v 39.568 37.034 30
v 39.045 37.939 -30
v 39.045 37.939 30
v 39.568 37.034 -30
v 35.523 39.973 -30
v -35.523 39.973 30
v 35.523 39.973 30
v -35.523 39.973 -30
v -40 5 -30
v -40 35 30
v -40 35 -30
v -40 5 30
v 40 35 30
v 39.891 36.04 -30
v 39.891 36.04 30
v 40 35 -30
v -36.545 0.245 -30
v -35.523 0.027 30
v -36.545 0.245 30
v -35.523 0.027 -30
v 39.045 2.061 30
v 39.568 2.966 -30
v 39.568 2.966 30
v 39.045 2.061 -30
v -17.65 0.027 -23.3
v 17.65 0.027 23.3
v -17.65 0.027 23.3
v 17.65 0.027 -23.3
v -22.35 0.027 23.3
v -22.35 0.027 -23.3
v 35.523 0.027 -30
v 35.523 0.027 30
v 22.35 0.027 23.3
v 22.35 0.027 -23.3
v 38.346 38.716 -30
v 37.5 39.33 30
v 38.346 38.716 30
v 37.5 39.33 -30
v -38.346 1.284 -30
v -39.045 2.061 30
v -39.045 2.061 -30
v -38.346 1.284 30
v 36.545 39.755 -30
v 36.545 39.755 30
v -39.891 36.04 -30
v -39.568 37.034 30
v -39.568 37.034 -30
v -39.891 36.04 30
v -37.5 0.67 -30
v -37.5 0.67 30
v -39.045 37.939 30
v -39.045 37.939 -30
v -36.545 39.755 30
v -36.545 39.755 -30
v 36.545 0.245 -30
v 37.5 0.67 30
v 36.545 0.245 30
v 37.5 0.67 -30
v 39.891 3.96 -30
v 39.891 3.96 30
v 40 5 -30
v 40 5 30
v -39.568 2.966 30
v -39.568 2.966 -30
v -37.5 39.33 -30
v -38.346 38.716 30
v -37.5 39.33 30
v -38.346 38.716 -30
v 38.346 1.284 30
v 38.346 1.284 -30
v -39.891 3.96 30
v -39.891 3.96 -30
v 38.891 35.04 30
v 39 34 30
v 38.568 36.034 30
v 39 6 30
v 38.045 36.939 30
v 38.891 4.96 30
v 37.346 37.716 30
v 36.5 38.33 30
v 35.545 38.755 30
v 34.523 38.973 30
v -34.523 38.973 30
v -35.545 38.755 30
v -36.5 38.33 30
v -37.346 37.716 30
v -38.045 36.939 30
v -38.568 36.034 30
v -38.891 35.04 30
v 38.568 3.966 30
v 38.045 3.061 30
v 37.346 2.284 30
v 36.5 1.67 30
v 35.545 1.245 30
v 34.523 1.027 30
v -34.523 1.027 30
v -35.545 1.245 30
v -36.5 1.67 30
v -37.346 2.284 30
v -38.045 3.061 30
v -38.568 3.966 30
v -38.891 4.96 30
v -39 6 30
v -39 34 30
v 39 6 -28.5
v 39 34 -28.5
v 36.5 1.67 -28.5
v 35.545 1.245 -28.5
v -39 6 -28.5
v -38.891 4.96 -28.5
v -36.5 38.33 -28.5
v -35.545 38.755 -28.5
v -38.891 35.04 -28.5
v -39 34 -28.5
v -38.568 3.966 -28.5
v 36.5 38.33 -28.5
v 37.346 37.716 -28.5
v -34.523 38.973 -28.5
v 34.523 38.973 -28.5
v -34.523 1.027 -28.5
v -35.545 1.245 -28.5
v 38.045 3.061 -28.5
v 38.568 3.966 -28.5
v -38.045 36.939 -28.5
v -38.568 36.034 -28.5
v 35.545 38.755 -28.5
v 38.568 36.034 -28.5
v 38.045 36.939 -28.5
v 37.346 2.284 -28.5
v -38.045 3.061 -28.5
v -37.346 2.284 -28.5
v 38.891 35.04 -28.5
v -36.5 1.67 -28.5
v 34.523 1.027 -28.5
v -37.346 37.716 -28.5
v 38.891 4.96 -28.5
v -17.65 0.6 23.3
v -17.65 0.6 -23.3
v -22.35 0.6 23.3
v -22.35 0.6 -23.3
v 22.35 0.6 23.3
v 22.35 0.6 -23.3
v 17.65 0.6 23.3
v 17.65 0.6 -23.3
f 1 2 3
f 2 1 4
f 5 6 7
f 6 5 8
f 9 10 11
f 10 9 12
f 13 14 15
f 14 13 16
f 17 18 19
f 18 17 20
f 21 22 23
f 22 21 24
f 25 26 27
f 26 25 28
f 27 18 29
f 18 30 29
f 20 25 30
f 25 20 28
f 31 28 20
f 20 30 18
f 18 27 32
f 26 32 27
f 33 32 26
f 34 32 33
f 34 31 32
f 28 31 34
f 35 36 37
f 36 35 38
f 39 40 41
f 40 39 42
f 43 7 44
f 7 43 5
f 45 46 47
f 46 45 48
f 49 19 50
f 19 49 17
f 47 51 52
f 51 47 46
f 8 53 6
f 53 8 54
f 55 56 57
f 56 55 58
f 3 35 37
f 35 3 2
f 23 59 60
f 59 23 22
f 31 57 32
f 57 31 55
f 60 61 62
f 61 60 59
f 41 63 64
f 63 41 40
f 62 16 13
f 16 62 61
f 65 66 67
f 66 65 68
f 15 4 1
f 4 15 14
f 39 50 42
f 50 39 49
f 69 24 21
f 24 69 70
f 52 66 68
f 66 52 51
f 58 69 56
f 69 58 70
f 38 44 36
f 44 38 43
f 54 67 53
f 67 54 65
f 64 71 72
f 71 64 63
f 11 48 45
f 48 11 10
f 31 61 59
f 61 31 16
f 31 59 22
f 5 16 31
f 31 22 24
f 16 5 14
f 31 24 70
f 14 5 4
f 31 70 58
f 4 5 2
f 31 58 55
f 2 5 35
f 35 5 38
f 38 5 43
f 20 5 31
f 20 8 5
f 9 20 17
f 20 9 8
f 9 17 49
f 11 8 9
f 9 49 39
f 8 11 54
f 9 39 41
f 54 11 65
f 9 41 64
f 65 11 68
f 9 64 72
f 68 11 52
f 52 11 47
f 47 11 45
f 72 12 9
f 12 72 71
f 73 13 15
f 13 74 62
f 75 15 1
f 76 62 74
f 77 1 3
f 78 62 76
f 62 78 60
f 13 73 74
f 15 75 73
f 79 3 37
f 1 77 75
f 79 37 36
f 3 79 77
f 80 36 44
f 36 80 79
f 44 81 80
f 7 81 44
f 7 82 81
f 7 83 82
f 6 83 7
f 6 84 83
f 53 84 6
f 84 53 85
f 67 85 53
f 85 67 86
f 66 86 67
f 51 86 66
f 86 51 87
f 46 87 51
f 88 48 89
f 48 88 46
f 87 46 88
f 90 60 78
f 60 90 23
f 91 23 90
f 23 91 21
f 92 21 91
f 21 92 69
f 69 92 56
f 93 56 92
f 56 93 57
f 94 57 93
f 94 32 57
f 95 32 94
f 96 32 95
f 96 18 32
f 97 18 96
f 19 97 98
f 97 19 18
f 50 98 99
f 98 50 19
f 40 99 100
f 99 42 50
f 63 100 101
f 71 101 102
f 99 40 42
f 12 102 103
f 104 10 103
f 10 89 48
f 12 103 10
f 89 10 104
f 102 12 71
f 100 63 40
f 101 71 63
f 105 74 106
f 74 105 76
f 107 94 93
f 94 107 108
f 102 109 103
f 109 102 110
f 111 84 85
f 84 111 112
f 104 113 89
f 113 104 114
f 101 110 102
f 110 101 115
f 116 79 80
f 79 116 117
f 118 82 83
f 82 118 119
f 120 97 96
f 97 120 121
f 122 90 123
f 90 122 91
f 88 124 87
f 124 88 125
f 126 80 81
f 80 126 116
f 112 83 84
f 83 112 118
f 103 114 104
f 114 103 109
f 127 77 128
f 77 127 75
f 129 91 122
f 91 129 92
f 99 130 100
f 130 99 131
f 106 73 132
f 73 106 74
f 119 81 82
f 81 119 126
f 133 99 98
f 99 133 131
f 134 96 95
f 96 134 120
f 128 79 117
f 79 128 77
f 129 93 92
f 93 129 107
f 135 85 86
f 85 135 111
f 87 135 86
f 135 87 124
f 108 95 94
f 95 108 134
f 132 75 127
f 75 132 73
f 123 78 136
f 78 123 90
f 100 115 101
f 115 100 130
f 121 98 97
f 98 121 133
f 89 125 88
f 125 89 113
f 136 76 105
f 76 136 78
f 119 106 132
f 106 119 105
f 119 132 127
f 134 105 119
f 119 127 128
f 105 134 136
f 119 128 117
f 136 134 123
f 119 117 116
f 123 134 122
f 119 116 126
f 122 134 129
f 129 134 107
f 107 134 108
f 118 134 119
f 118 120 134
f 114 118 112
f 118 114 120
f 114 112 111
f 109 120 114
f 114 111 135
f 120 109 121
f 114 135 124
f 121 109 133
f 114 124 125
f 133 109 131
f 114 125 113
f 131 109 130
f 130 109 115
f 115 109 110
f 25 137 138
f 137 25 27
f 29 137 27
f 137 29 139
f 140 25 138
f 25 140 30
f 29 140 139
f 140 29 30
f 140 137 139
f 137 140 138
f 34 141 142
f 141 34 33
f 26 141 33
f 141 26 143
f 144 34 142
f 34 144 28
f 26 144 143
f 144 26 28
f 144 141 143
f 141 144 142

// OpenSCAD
// file: IKEA Skadis v2 hook cutouts.scad
skadis_hook_width = 4.5;
skadis_hook_height = 46;
skadis_hole_spacing_width = 40; // middle to middle
cutout_tolerance_w = 0.2;
cutout_tolerance_h = 0.6;


module skadis_hook_cutout(center=false, hook_count=2) {
    
    if(center) {
        translate([-(skadis_hole_spacing_width + skadis_hook_width) / 2, 0, - skadis_hook_height / 2])
        object(hook_count);
    } else {
        object();
    }
    

}

module object(hook_count=2) {
    union() {

        // Cutout for the hook 1
        color("red")
        translate([- cutout_tolerance_w / 2, 0, - cutout_tolerance_h / 2])
        cube([skadis_hook_width + cutout_tolerance_w, 2, skadis_hook_height + cutout_tolerance_h]);

        // Cutout for the hook 2
        color("red")
        translate([- cutout_tolerance_w / 2 + skadis_hole_spacing_width, 0, - cutout_tolerance_h / 2])
        cube([skadis_hook_width + cutout_tolerance_w, 2, skadis_hook_height + cutout_tolerance_h]);

    }
}

skadis_hook_cutout(center = false);
// file: ../modules/roundedcube.scad
// More information: https://danielupshaw.com/openscad-rounded-corners/


// Examples
// color("Yellow")
// roundedcube(3, true, 0.7, "xmin");

// translate(v = [1, 0, 2])
// color("Pink")
// roundedcube([4, 2, 2], false, 0.6, "zmax");

// translate(v = [-4, -1, 2])
// color("Lightblue")
// roundedcube(2, false);

// translate(v = [0, 0, 6])
// color("Orange")
// roundedcube([3, 2, 2], true, 0.2);

// translate(v = [2.5, -0.5, 5])
// color("Green")
// roundedcube([3, 2, 2], false, 0.4, "z");

// Set to 0.01 for higher definition curves (renders slower)
$fs = 0.15;

module roundedcube(size = [1, 1, 1], center = false, radius = 0.5, apply_to = "all") {
	// If single value, convert to [x, y, z] vector
	size = (size[0] == undef) ? [size, size, size] : size;

	translate_min = radius;
	translate_xmax = size[0] - radius;
	translate_ymax = size[1] - radius;
	translate_zmax = size[2] - radius;

	diameter = radius * 2;

	obj_translate = (center == false) ?
		[0, 0, 0] : [
			-(size[0] / 2),
			-(size[1] / 2),
			-(size[2] / 2)
		];

	translate(v = obj_translate) {
		hull() {
			for (translate_x = [translate_min, translate_xmax]) {
				x_at = (translate_x == translate_min) ? "min" : "max";
				for (translate_y = [translate_min, translate_ymax]) {
					y_at = (translate_y == translate_min) ? "min" : "max";
					for (translate_z = [translate_min, translate_zmax]) {
						z_at = (translate_z == translate_min) ? "min" : "max";

						translate(v = [translate_x, translate_y, translate_z])
						if (
							(apply_to == "all") ||
							(apply_to == "xmin" && x_at == "min") || (apply_to == "xmax" && x_at == "max") ||
							(apply_to == "ymin" && y_at == "min") || (apply_to == "ymax" && y_at == "max") ||
							(apply_to == "zmin" && z_at == "min") || (apply_to == "zmax" && z_at == "max")
						) {
							sphere(r = radius);
						} else {
							rotate = 
								(apply_to == "xmin" || apply_to == "xmax" || apply_to == "x") ? [0, 90, 0] : (
								(apply_to == "ymin" || apply_to == "ymax" || apply_to == "y") ? [90, 90, 0] :
								[0, 0, 0]
							);
							rotate(a = rotate)
							cylinder(h = diameter, r = radius, center = true);
						}
					}
				}
			}
		}
	}
}
// main file
_width = 80;
_depth = 40;
_height = 60;

//use <./IKEA Skadis include backwall with 3 hooks.scad>
use <../modules/roundedcube.scad>
use <./IKEA Skadis v2 hook cutouts.scad>

thickness = 1;

difference() {
    translate([0, _depth / 2, 0])
    difference() {
        roundedcube(size = [_width, _depth, _height], center = true, radius = 5, apply_to = "z");
        color("red")
        translate([0, 0, thickness])
        roundedcube(size = [_width - thickness * 2, _depth - thickness * 2, _height - thickness * 2 + 1], center = true, radius = 5, apply_to = "z");
    }
    color("green")
    translate([0, -1.4, 0])
    skadis_hook_cutout(center=true);
}
